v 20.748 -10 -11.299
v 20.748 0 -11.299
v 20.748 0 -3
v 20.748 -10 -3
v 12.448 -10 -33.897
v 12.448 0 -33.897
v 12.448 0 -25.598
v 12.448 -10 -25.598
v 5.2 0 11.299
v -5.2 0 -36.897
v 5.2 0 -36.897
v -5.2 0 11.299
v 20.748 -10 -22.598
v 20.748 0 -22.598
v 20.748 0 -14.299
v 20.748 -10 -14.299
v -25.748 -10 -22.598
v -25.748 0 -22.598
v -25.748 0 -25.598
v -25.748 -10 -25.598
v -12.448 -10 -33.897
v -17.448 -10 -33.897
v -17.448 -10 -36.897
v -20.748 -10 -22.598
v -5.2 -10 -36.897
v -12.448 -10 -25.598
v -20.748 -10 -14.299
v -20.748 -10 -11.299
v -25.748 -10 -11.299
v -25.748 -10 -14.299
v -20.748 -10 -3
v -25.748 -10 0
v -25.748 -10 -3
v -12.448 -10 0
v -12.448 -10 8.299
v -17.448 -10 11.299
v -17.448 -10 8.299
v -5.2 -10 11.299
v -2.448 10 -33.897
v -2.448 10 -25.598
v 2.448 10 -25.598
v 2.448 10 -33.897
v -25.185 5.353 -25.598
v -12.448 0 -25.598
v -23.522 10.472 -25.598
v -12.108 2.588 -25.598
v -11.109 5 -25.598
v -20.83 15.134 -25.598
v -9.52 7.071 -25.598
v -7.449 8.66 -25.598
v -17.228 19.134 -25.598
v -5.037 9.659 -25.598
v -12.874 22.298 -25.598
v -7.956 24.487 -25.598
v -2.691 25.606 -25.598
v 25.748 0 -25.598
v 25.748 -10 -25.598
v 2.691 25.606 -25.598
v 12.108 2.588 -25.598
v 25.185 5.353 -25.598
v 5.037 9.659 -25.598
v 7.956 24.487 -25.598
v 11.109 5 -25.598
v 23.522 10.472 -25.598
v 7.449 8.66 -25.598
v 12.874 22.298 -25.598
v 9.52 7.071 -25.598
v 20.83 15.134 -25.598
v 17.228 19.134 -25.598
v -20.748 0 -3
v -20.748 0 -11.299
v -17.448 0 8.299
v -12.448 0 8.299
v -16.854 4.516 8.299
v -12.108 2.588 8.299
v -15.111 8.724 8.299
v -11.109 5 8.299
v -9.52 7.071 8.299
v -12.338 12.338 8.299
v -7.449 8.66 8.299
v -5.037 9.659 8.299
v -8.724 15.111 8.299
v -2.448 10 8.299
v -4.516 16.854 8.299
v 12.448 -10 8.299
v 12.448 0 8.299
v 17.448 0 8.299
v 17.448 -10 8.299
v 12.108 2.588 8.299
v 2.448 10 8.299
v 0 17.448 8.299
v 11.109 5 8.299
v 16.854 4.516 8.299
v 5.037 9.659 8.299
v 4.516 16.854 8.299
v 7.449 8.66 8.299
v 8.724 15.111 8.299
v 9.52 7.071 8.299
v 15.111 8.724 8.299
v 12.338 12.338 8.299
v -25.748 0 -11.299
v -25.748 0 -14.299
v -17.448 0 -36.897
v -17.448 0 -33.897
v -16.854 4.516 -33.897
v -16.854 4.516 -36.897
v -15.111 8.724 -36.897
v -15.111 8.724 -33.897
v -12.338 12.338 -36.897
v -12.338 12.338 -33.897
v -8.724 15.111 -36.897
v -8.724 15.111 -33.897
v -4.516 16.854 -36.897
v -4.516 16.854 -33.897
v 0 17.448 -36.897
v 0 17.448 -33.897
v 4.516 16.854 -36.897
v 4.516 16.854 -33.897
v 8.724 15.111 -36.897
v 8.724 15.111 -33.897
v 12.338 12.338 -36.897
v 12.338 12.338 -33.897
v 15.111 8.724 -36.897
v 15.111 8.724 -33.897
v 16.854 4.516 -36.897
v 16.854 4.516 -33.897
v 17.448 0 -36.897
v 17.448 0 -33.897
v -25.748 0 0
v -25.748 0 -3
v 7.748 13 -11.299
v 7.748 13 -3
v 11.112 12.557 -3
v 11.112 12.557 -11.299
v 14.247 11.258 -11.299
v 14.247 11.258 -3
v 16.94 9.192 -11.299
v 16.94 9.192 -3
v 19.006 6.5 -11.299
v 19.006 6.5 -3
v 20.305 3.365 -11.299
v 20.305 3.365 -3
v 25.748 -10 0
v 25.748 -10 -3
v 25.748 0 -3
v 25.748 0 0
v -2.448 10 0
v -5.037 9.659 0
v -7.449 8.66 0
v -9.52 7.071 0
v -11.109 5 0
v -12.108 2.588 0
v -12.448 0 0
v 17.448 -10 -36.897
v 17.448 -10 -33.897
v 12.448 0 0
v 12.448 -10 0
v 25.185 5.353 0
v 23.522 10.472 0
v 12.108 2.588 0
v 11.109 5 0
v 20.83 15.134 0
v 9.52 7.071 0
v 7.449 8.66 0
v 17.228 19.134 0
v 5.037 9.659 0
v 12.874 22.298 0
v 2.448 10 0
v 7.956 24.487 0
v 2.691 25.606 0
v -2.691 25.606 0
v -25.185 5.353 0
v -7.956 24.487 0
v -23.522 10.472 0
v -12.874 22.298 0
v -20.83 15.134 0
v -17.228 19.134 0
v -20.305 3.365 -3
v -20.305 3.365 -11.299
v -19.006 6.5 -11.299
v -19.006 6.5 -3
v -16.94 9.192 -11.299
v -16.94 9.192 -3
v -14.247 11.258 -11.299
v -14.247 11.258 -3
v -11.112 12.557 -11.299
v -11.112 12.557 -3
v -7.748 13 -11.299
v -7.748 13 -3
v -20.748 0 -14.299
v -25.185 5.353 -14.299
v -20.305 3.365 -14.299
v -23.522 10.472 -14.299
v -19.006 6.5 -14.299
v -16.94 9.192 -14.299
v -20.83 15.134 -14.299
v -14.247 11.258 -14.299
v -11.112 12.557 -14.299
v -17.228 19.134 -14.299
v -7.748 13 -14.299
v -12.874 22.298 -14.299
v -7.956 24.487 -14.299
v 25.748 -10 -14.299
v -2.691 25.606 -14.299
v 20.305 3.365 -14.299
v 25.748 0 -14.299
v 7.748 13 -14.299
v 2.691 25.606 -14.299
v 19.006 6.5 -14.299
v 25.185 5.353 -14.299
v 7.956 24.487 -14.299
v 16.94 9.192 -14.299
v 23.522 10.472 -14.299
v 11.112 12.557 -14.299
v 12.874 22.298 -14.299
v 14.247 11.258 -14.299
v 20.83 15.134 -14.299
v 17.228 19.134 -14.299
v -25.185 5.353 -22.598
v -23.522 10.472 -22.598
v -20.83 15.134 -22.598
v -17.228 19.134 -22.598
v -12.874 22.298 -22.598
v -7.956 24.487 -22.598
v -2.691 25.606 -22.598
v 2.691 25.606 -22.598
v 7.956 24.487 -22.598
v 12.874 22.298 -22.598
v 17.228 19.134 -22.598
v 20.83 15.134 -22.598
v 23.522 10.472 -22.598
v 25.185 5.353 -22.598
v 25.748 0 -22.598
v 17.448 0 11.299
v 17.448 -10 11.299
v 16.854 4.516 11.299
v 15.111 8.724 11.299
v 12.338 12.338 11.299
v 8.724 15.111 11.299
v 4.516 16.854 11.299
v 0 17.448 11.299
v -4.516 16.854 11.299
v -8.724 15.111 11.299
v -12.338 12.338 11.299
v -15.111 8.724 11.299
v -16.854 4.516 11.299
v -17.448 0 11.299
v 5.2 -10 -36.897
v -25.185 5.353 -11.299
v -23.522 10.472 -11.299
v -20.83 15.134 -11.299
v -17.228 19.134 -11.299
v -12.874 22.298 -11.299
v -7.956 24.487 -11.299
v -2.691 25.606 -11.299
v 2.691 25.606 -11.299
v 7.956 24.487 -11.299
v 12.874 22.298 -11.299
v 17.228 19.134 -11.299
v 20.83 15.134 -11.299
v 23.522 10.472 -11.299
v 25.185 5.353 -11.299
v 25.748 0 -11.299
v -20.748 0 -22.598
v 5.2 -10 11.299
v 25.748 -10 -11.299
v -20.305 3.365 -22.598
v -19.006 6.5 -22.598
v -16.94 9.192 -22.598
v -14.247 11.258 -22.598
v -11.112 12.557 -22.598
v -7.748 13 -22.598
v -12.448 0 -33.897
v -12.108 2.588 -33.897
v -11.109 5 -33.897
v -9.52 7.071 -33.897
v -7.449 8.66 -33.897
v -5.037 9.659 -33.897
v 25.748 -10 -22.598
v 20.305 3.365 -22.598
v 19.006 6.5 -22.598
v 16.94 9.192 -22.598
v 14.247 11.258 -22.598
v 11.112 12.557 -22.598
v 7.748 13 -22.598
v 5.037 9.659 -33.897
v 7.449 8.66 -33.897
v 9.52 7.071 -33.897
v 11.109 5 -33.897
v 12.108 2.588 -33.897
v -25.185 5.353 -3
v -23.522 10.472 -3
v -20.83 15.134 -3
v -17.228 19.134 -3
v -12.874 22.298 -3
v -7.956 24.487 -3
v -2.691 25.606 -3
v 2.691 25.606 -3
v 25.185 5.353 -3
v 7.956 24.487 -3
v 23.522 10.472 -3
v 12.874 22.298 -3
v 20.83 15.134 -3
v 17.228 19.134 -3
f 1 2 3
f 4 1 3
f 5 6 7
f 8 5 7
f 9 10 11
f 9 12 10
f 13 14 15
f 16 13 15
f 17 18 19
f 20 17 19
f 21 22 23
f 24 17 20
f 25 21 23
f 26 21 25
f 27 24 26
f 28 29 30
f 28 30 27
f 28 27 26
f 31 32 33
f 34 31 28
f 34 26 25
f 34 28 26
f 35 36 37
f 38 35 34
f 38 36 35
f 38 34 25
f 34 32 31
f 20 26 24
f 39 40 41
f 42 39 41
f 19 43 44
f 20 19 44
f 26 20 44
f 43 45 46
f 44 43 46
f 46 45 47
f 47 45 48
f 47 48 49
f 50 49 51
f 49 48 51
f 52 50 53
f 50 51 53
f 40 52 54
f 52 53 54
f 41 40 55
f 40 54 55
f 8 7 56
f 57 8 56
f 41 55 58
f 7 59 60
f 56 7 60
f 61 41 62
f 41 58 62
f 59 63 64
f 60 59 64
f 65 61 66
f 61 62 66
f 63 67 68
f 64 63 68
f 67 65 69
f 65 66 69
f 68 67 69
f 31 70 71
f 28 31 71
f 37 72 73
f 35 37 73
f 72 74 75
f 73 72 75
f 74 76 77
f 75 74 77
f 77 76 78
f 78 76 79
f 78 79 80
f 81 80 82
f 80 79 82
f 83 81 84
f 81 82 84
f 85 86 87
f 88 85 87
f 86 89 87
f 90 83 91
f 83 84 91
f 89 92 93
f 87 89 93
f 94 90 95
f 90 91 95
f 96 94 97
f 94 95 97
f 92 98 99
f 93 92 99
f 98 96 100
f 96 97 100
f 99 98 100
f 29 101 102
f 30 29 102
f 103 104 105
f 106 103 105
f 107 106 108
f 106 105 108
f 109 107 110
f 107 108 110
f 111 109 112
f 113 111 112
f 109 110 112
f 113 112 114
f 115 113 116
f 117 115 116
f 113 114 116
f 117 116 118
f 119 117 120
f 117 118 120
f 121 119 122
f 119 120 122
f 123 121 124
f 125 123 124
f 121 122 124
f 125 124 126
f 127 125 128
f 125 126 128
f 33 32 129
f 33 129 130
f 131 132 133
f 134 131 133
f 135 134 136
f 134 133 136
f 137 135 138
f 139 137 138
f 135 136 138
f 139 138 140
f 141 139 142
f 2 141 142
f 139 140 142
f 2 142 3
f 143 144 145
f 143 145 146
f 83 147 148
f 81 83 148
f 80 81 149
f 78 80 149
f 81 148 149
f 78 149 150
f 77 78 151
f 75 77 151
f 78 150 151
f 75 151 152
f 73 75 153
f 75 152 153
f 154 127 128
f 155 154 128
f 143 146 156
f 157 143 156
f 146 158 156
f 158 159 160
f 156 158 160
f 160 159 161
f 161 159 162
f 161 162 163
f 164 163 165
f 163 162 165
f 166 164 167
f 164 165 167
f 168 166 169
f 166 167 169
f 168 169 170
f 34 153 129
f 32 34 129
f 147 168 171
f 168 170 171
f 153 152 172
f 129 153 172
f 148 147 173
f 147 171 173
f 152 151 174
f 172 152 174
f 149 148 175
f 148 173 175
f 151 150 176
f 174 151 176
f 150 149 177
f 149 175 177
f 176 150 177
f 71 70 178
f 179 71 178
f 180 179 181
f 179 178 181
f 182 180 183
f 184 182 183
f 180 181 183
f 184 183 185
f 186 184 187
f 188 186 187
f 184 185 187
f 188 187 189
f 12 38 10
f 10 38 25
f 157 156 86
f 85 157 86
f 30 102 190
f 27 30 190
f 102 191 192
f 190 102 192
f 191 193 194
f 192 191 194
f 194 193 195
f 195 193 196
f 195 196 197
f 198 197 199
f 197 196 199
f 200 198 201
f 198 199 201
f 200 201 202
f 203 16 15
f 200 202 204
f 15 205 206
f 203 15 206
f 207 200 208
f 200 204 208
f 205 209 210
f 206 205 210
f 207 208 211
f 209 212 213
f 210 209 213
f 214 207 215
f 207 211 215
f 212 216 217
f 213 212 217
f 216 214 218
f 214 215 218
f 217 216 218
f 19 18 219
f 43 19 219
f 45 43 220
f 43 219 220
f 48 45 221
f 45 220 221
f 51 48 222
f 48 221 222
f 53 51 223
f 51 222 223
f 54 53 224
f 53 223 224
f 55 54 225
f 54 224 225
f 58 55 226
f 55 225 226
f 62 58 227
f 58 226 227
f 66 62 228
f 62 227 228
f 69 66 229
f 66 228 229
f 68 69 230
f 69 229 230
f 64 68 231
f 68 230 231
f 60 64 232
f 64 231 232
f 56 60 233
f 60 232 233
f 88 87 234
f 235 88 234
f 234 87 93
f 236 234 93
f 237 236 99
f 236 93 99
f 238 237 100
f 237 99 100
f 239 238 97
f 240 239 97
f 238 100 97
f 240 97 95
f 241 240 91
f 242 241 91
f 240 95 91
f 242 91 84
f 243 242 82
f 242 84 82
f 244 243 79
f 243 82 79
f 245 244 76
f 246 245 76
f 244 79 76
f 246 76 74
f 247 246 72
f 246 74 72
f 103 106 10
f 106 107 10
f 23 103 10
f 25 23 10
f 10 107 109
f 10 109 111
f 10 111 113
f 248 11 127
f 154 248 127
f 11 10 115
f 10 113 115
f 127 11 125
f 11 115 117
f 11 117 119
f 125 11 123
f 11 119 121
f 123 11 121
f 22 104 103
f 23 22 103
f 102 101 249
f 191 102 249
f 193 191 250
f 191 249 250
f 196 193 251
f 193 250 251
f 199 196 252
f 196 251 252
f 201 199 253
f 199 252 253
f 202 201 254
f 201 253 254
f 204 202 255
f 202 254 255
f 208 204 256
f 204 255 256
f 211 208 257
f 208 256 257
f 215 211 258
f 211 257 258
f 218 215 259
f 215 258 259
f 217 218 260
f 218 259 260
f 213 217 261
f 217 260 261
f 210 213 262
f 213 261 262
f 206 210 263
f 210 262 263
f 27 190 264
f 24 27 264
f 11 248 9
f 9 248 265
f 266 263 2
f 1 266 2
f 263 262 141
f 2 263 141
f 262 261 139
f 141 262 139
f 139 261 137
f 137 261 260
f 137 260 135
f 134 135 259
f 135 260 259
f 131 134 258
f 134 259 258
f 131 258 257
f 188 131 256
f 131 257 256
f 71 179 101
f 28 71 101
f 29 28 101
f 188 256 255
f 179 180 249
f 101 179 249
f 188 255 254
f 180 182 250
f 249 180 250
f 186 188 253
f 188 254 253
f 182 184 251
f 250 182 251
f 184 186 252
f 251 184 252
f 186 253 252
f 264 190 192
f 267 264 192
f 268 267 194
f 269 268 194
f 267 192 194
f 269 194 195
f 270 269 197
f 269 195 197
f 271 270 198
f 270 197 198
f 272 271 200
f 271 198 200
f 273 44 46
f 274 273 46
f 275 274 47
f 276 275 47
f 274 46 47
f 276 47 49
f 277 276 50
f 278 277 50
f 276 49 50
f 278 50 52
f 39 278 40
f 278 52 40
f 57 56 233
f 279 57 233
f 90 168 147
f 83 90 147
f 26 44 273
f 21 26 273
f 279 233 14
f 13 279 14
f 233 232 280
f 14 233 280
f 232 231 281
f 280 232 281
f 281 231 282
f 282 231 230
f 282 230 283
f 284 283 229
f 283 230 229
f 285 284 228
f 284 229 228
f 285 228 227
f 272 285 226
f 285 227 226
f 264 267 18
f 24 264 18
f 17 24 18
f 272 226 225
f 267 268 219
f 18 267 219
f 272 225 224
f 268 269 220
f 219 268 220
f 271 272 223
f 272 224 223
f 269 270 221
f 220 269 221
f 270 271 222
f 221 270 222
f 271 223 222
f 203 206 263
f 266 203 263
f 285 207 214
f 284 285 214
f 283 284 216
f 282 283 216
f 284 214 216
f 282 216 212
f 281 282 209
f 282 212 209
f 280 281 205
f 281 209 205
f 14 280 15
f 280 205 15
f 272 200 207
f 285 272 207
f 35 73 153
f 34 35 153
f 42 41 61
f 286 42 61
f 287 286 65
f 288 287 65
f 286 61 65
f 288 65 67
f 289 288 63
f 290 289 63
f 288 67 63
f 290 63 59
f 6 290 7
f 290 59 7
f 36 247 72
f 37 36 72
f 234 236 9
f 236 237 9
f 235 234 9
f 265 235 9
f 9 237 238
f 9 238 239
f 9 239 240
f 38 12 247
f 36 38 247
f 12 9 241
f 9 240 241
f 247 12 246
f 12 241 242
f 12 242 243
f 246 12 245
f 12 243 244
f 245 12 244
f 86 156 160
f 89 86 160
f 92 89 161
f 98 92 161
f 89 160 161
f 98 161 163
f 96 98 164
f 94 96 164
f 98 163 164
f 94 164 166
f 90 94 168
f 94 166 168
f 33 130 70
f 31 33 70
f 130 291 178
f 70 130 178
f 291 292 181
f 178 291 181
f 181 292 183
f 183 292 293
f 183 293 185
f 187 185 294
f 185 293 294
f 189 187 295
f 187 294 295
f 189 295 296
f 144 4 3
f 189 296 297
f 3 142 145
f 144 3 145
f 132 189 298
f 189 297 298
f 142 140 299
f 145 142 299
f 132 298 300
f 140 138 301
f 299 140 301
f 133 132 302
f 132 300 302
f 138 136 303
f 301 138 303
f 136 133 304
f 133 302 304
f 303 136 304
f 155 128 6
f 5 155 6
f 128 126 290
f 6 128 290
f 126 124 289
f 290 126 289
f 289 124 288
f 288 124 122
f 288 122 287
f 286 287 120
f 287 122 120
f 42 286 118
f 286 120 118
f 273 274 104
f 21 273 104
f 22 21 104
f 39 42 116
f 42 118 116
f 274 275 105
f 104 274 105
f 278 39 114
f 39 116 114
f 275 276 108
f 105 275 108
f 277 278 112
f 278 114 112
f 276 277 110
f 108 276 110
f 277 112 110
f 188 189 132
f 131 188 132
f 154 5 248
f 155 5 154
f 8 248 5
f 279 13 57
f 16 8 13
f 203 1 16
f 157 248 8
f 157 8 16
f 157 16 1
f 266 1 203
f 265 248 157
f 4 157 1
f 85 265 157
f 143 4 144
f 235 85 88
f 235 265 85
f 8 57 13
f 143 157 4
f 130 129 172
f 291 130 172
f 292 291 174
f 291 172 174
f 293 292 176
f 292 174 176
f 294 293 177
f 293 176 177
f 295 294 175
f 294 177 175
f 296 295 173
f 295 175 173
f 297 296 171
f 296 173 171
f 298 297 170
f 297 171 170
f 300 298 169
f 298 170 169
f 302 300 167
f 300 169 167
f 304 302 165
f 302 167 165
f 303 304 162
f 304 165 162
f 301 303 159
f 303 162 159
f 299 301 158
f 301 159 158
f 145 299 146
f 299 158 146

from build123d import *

# Parameters (mm, degrees)
F2_DEPTH  = 8.299
F4_DEPTH  = 3
F6_DEPTH  = 3
F8_DEPTH  = 8.299
F10_DEPTH = 3
F12_DEPTH = 8.299
F14_DEPTH = 3
F16_DEPTH = 8.299
F18_DEPTH = 3
F20_DEPTH = 10
F22_DEPTH = 10


with BuildPart() as f2:
    # F1 (on Top) → F2 (new body)
    with BuildSketch(Plane.XY):
        with BuildLine():
            ThreePointArc((-2.4485, 10), (-9.5195678119, 7.0710678119), (-12.4485, 0))
            Line((-12.4485, 0), (12.4485, 0))
            ThreePointArc((12.4485, 0), (9.5195678119, 7.0710678119), (2.4485, 10))
            Line((2.4485, 10), (0, 10))
            Line((0, 10), (-2.4485, 10))
        make_face()
    extrude(amount=F2_DEPTH)

    # F3 (on face) → F4 (join)
    with BuildSketch(Plane.XY.offset(8.299)):
        with BuildLine():
            ThreePointArc((17.4485, 0), (0, 17.4485), (-17.4485, 0))
            Line((-17.4485, 0), (17.4485, 0))
        make_face()
    extrude(amount=F4_DEPTH)

    # F5 (on face) → F6 (join)
    with BuildSketch(Plane(origin=(0, 0, 0), x_dir=(1, 0, 0), z_dir=(0, 0, -1))):
        with BuildLine():
            ThreePointArc((-25.7475, 0), (0, -25.7475), (25.7475, 0))
            Line((25.7475, 0), (-25.7475, 0))
        make_face()
    extrude(amount=F6_DEPTH)

    # F7 (on face) → F8 (join)
    with BuildSketch(Plane(origin=(0, 0, -3), x_dir=(1, 0, 0), z_dir=(0, 0, -1))):
        with BuildLine():
            ThreePointArc((7.7475, -13), (16.9398881554, -9.1923881554), (20.7475, 0))
            Line((20.7475, 0), (-20.7475, 0))
            ThreePointArc((-20.7475, 0), (-16.9398881554, -9.1923881554), (-7.7475, -13))
            Line((-7.7475, -13), (0, -13))
            Line((0, -13), (7.7475, -13))
        make_face()
    extrude(amount=F8_DEPTH)

    # F9 (on face) → F10 (join)
    with BuildSketch(Plane(origin=(0, 0, -11.299), x_dir=(1, 0, 0), z_dir=(0, 0, -1))):
        with BuildLine():
            ThreePointArc((-25.7475, 0), (0, -25.7475), (25.7475, 0))
            Line((25.7475, 0), (-25.7475, 0))
        make_face()
    extrude(amount=F10_DEPTH)

    # F11 (on face) → F12 (join)
    with BuildSketch(Plane(origin=(0, 0, -14.299), x_dir=(1, 0, 0), z_dir=(0, 0, -1))):
        with BuildLine():
            ThreePointArc((7.7475, -13), (16.9398881554, -9.1923881554), (20.7475, 0))
            Line((20.7475, 0), (-20.7475, 0))
            ThreePointArc((-20.7475, 0), (-16.9398881554, -9.1923881554), (-7.7475, -13))
            Line((-7.7475, -13), (0, -13))
            Line((0, -13), (7.7475, -13))
        make_face()
    extrude(amount=F12_DEPTH)

    # F13 (on face) → F14 (join)
    with BuildSketch(Plane(origin=(0, 0, -22.598), x_dir=(1, 0, 0), z_dir=(0, 0, -1))):
        with BuildLine():
            ThreePointArc((-25.7475, 0), (0, -25.7475), (25.7475, 0))
            Line((25.7475, 0), (-25.7475, 0))
        make_face()
    extrude(amount=F14_DEPTH)

    # F15 (on face) → F16 (join)
    with BuildSketch(Plane(origin=(0, 0, -25.598), x_dir=(1, 0, 0), z_dir=(0, 0, -1))):
        with BuildLine():
            Line((-2.4485, -10), (0, -10))
            Line((0, -10), (2.4485, -10))
            ThreePointArc((2.4485, -10), (9.5195678119, -7.0710678119), (12.4485, 0))
            Line((12.4485, 0), (0, 0))
            Line((0, 0), (-12.4485, 0))
            ThreePointArc((-12.4485, 0), (-9.5195678119, -7.0710678119), (-2.4485, -10))
        make_face()
    extrude(amount=F16_DEPTH)

    # F17 (on face) → F18 (join)
    with BuildSketch(Plane(origin=(0, 0, -33.897), x_dir=(1, 0, 0), z_dir=(0, 0, -1))):
        with BuildLine():
            ThreePointArc((-17.4485, 0), (0, -17.4485), (17.4485, 0))
            Line((17.4485, 0), (-17.4485, 0))
        make_face()
    extrude(amount=F18_DEPTH)

    # F19 (on face) → F20 (join)
    with BuildSketch(Plane.XZ):
        Polygon((0, -36.897), (17.4485, -36.897), (17.4485, -33.897), (12.4485, -33.897), (12.4485, -25.598), (25.7475, -25.598), (25.7475, -22.598), (20.7475, -22.598), (20.7475, -14.299), (25.7475, -14.299), (25.7475, -11.299), (20.7475, -11.299), (20.7475, -3), (25.7475, -3), (25.7475, 0), (12.4485, 0), (12.4485, 8.299), (17.4485, 8.299), (17.4485, 11.299), (0, 11.299), (-17.4485, 11.299), (-17.4485, 8.299), (-12.4485, 8.299), (-12.4485, 0), (-25.7475, 0), (-25.7475, -3), (-20.7475, -3), (-20.7475, -11.299), (-25.7475, -11.299), (-25.7475, -14.299), (-20.7475, -14.299), (-20.7475, -22.598), (-25.7475, -22.598), (-25.7475, -25.598), (-12.4485, -25.598), (-12.4485, -33.897), (-17.4485, -33.897), (-17.4485, -36.897), align=None)
    extrude(amount=F20_DEPTH)

    # F21 (on face) → F22 (cut)
    with BuildSketch(Plane.XZ.offset(10)):
        Polygon((-5.2, -36.897), (0, -36.897), (5.2, -36.897), (5.2, 11.299), (0, 11.299), (-5.2, 11.299), align=None)
    extrude(amount=-F22_DEPTH, mode=Mode.SUBTRACT)


solid = f2.part
